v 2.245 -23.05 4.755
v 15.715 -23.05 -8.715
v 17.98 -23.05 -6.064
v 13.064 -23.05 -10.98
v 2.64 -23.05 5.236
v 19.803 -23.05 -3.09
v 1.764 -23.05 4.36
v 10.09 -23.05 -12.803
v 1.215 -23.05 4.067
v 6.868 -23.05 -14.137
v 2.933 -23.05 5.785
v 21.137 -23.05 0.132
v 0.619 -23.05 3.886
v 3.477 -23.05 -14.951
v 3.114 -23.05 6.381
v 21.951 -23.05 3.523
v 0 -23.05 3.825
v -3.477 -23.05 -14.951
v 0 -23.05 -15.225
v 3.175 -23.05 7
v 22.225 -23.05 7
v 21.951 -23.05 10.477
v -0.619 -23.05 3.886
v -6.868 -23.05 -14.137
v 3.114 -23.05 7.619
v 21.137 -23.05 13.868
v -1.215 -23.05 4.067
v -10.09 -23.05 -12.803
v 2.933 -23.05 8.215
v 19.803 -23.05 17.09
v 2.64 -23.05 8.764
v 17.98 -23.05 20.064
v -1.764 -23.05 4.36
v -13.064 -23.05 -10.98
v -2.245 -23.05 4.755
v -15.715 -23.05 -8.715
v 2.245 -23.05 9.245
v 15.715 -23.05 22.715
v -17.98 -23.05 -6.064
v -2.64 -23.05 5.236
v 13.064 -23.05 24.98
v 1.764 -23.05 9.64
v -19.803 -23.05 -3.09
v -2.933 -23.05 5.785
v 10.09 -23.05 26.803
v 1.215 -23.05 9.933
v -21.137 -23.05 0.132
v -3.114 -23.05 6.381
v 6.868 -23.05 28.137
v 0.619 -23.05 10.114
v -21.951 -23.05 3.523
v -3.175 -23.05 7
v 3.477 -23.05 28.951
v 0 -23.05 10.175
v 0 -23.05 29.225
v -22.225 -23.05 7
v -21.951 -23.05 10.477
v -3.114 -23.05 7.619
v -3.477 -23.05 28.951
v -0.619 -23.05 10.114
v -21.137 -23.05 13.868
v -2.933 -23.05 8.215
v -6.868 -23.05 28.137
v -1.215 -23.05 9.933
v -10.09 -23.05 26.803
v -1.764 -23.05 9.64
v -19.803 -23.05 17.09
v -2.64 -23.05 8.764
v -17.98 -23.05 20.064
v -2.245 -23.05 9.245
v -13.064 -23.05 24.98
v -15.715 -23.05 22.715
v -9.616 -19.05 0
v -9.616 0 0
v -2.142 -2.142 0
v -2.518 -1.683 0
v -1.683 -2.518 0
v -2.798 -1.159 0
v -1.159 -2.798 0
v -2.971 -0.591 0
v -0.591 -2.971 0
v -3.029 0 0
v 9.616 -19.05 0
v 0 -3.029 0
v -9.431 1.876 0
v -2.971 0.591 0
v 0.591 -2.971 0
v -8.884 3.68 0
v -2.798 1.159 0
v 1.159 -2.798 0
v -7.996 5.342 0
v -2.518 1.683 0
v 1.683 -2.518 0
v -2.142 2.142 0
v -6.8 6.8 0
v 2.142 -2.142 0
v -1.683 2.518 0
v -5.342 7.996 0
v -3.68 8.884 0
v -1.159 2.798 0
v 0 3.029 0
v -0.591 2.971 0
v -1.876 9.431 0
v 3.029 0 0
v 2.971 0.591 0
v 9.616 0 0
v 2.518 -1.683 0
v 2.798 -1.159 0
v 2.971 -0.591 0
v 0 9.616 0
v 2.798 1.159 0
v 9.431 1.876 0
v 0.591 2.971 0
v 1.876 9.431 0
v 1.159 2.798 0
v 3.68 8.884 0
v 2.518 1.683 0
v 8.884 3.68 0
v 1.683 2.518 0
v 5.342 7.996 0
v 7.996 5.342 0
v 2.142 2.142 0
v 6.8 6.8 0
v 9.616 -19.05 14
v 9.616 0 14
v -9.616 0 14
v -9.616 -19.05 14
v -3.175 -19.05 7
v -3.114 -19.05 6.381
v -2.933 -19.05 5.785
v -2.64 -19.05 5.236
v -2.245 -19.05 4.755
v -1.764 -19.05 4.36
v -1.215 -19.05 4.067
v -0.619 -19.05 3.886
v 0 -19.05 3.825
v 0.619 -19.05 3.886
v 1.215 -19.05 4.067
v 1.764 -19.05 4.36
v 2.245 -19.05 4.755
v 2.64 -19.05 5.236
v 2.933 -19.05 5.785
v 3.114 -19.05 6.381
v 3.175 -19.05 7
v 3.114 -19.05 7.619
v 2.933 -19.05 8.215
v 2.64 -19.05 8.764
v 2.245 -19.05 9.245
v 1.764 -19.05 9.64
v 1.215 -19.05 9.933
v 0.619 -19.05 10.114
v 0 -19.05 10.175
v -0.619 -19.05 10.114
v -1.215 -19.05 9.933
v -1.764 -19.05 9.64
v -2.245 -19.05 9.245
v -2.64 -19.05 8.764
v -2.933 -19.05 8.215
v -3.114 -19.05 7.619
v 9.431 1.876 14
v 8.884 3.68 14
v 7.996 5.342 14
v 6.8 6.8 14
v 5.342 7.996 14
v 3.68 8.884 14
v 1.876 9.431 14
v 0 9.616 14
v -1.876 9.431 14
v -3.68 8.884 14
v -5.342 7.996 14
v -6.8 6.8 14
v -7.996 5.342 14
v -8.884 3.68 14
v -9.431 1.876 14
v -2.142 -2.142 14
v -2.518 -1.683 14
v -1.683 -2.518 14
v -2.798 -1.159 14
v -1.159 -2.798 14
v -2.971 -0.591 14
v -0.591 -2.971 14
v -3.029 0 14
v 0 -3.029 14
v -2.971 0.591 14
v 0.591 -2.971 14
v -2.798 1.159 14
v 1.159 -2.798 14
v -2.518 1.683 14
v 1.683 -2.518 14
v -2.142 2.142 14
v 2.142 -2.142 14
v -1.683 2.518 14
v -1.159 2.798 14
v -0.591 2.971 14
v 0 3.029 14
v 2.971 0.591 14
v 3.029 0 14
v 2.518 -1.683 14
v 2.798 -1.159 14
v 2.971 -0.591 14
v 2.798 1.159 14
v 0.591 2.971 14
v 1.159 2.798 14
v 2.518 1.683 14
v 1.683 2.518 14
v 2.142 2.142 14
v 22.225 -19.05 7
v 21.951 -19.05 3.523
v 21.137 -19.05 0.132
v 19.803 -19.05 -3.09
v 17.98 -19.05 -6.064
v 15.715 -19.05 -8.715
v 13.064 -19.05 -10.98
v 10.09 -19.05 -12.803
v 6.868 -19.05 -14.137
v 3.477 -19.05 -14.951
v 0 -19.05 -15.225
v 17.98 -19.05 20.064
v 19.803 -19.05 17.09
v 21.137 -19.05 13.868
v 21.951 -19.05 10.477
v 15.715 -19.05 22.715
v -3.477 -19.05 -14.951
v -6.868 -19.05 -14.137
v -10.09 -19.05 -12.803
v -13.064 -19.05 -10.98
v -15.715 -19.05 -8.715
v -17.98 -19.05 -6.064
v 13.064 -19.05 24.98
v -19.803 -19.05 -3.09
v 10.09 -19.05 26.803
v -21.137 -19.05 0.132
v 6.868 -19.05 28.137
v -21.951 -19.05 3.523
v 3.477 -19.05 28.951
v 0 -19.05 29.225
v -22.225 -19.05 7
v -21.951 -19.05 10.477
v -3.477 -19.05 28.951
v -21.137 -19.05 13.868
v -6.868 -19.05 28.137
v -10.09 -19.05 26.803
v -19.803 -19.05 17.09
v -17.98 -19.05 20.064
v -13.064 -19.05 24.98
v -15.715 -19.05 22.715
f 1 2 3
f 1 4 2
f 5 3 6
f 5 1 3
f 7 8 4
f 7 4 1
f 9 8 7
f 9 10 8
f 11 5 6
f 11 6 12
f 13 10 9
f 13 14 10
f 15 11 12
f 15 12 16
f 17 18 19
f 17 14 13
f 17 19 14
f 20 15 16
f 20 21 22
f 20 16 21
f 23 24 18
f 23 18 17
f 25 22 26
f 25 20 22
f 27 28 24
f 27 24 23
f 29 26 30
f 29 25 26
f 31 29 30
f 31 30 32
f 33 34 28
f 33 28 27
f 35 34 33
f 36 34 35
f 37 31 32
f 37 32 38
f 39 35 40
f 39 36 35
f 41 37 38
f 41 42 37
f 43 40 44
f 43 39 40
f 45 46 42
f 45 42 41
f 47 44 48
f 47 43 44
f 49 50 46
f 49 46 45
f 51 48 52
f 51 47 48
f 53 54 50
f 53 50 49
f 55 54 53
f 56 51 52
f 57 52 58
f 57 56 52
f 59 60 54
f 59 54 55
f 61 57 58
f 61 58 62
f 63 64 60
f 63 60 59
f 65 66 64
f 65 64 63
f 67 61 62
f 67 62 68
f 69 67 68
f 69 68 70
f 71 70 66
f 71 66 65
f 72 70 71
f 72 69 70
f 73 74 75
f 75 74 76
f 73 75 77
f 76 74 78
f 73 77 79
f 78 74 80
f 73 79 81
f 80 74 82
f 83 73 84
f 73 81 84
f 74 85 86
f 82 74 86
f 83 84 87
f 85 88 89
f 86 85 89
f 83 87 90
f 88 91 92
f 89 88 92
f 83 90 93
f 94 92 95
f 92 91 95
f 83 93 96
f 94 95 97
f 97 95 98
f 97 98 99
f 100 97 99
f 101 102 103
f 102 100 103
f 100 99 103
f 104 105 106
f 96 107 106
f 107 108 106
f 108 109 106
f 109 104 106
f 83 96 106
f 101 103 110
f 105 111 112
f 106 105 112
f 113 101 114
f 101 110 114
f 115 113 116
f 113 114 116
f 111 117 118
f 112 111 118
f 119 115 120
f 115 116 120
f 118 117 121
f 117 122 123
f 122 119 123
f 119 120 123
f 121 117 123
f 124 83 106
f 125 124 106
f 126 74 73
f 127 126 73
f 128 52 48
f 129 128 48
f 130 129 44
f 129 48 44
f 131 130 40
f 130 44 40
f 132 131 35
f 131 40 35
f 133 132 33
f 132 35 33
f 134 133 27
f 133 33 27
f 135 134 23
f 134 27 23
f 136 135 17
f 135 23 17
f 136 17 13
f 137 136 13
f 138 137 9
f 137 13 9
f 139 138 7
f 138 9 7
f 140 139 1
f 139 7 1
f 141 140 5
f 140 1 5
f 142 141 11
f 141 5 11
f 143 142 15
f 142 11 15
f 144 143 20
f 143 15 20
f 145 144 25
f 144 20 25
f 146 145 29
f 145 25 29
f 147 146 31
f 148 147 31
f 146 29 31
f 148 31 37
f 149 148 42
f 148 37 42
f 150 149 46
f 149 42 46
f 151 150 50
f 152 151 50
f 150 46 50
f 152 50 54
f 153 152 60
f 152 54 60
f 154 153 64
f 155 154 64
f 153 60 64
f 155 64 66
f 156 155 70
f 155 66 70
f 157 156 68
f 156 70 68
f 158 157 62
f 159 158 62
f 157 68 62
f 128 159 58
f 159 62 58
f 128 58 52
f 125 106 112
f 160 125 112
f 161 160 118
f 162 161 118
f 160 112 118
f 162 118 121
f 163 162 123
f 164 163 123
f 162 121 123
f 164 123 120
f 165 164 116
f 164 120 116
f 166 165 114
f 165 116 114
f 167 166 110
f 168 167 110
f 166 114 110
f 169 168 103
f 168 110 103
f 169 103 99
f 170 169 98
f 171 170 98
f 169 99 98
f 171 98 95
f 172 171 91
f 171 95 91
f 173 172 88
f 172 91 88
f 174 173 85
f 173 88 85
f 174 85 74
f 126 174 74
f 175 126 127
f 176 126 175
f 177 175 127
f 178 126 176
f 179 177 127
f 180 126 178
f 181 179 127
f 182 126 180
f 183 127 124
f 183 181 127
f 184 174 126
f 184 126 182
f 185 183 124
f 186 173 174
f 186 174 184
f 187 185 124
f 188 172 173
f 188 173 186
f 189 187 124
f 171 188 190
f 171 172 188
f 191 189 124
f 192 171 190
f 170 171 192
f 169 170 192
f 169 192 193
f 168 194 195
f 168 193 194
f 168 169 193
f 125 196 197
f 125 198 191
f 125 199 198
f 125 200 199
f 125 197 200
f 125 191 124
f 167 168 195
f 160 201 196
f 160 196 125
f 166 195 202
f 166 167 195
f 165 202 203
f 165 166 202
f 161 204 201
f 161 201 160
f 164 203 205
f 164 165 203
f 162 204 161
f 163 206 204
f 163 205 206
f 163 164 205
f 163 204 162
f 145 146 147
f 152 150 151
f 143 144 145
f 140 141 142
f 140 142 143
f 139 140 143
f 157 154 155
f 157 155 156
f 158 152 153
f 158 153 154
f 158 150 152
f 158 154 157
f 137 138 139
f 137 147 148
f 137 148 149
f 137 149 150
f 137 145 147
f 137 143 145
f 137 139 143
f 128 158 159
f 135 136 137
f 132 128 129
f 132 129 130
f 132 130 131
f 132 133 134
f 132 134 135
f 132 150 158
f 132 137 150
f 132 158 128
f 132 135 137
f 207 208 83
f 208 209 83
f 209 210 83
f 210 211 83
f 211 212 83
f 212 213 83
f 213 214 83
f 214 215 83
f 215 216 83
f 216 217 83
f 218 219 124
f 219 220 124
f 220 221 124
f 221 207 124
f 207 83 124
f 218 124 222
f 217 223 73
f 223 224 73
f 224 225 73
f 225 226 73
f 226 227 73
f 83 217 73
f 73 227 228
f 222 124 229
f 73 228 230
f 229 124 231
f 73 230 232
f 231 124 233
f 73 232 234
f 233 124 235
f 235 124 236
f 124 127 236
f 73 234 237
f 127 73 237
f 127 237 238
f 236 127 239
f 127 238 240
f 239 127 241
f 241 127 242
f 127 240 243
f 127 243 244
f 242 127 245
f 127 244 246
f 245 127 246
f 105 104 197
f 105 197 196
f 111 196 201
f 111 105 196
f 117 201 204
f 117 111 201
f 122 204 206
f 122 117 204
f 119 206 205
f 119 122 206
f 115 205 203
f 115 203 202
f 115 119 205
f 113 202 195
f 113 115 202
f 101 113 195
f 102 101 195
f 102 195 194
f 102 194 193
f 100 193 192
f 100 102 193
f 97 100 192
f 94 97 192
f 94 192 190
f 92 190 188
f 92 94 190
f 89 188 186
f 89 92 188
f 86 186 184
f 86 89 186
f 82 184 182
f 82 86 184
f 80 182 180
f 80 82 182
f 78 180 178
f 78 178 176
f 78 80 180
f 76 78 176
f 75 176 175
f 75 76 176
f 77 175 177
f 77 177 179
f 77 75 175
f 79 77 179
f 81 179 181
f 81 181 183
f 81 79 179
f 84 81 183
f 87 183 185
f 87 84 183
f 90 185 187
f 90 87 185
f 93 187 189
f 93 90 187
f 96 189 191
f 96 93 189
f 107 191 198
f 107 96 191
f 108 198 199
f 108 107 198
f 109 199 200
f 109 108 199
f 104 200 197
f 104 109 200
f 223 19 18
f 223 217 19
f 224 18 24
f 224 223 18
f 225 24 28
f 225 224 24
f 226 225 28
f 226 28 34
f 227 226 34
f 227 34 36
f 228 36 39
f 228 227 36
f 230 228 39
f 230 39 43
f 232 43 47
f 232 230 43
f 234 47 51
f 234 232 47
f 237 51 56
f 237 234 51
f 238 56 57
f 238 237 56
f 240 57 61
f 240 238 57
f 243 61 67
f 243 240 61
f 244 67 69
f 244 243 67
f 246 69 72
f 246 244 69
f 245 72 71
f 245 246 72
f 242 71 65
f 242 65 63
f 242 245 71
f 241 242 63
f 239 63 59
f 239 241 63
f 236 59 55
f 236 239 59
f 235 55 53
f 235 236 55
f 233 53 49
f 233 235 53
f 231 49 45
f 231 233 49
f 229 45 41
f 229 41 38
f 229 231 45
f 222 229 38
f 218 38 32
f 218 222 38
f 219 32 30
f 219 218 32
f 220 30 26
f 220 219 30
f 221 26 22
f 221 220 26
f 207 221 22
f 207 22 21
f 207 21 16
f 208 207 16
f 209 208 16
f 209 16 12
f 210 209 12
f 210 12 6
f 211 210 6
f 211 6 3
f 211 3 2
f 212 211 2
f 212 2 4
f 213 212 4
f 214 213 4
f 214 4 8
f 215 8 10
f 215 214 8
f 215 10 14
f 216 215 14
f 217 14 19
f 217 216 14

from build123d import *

# Parameters (mm, degrees)
SKETCH2_R           = 3.02870098
BOSS_EXTRUDE1_DEPTH = 14
SKETCH3_W           = 22.225
SKETCH3_H           = 4
SKETCH4_R           = 3.175
CUT_EXTRUDE1_DEPTH  = 4


with BuildPart() as part:
    # Sketch2 → Boss-Extrude1 (new body)
    with BuildSketch(Plane.XY):
        with BuildLine():
            Line((-9.616125613, -19.05), (9.616125613, -19.05))
            Line((9.616125613, -19.05), (9.616125613, 0))
            ThreePointArc((9.616125613, 0), (0, 9.616125613), (-9.616125613, 0))
            Line((-9.616125613, 0), (-9.616125613, -19.05))
        make_face()
        Circle(SKETCH2_R, mode=Mode.SUBTRACT)
    extrude(amount=BOSS_EXTRUDE1_DEPTH)

    # Sketch3 → Revolve1 (revolve)
    with BuildSketch(Plane(origin=(0, 0, 0), x_dir=(0, 0, -1), z_dir=(1, 0, 0))):
        with Locations((4.1125, -21.05)):
            Rectangle(SKETCH3_W, SKETCH3_H)
    revolve(axis=Axis((0, -23.05, 7), (0, 1, 0)))

    # Sketch4 → Cut-Extrude1 (cut)
    with BuildSketch(Plane(origin=(0, -23.05, 0), x_dir=(-1, 0, 0), z_dir=(0, -1, 0))):
        with Locations((0, -7)):
            Circle(SKETCH4_R)
    extrude(amount=-CUT_EXTRUDE1_DEPTH, mode=Mode.SUBTRACT)


solid = part.part
